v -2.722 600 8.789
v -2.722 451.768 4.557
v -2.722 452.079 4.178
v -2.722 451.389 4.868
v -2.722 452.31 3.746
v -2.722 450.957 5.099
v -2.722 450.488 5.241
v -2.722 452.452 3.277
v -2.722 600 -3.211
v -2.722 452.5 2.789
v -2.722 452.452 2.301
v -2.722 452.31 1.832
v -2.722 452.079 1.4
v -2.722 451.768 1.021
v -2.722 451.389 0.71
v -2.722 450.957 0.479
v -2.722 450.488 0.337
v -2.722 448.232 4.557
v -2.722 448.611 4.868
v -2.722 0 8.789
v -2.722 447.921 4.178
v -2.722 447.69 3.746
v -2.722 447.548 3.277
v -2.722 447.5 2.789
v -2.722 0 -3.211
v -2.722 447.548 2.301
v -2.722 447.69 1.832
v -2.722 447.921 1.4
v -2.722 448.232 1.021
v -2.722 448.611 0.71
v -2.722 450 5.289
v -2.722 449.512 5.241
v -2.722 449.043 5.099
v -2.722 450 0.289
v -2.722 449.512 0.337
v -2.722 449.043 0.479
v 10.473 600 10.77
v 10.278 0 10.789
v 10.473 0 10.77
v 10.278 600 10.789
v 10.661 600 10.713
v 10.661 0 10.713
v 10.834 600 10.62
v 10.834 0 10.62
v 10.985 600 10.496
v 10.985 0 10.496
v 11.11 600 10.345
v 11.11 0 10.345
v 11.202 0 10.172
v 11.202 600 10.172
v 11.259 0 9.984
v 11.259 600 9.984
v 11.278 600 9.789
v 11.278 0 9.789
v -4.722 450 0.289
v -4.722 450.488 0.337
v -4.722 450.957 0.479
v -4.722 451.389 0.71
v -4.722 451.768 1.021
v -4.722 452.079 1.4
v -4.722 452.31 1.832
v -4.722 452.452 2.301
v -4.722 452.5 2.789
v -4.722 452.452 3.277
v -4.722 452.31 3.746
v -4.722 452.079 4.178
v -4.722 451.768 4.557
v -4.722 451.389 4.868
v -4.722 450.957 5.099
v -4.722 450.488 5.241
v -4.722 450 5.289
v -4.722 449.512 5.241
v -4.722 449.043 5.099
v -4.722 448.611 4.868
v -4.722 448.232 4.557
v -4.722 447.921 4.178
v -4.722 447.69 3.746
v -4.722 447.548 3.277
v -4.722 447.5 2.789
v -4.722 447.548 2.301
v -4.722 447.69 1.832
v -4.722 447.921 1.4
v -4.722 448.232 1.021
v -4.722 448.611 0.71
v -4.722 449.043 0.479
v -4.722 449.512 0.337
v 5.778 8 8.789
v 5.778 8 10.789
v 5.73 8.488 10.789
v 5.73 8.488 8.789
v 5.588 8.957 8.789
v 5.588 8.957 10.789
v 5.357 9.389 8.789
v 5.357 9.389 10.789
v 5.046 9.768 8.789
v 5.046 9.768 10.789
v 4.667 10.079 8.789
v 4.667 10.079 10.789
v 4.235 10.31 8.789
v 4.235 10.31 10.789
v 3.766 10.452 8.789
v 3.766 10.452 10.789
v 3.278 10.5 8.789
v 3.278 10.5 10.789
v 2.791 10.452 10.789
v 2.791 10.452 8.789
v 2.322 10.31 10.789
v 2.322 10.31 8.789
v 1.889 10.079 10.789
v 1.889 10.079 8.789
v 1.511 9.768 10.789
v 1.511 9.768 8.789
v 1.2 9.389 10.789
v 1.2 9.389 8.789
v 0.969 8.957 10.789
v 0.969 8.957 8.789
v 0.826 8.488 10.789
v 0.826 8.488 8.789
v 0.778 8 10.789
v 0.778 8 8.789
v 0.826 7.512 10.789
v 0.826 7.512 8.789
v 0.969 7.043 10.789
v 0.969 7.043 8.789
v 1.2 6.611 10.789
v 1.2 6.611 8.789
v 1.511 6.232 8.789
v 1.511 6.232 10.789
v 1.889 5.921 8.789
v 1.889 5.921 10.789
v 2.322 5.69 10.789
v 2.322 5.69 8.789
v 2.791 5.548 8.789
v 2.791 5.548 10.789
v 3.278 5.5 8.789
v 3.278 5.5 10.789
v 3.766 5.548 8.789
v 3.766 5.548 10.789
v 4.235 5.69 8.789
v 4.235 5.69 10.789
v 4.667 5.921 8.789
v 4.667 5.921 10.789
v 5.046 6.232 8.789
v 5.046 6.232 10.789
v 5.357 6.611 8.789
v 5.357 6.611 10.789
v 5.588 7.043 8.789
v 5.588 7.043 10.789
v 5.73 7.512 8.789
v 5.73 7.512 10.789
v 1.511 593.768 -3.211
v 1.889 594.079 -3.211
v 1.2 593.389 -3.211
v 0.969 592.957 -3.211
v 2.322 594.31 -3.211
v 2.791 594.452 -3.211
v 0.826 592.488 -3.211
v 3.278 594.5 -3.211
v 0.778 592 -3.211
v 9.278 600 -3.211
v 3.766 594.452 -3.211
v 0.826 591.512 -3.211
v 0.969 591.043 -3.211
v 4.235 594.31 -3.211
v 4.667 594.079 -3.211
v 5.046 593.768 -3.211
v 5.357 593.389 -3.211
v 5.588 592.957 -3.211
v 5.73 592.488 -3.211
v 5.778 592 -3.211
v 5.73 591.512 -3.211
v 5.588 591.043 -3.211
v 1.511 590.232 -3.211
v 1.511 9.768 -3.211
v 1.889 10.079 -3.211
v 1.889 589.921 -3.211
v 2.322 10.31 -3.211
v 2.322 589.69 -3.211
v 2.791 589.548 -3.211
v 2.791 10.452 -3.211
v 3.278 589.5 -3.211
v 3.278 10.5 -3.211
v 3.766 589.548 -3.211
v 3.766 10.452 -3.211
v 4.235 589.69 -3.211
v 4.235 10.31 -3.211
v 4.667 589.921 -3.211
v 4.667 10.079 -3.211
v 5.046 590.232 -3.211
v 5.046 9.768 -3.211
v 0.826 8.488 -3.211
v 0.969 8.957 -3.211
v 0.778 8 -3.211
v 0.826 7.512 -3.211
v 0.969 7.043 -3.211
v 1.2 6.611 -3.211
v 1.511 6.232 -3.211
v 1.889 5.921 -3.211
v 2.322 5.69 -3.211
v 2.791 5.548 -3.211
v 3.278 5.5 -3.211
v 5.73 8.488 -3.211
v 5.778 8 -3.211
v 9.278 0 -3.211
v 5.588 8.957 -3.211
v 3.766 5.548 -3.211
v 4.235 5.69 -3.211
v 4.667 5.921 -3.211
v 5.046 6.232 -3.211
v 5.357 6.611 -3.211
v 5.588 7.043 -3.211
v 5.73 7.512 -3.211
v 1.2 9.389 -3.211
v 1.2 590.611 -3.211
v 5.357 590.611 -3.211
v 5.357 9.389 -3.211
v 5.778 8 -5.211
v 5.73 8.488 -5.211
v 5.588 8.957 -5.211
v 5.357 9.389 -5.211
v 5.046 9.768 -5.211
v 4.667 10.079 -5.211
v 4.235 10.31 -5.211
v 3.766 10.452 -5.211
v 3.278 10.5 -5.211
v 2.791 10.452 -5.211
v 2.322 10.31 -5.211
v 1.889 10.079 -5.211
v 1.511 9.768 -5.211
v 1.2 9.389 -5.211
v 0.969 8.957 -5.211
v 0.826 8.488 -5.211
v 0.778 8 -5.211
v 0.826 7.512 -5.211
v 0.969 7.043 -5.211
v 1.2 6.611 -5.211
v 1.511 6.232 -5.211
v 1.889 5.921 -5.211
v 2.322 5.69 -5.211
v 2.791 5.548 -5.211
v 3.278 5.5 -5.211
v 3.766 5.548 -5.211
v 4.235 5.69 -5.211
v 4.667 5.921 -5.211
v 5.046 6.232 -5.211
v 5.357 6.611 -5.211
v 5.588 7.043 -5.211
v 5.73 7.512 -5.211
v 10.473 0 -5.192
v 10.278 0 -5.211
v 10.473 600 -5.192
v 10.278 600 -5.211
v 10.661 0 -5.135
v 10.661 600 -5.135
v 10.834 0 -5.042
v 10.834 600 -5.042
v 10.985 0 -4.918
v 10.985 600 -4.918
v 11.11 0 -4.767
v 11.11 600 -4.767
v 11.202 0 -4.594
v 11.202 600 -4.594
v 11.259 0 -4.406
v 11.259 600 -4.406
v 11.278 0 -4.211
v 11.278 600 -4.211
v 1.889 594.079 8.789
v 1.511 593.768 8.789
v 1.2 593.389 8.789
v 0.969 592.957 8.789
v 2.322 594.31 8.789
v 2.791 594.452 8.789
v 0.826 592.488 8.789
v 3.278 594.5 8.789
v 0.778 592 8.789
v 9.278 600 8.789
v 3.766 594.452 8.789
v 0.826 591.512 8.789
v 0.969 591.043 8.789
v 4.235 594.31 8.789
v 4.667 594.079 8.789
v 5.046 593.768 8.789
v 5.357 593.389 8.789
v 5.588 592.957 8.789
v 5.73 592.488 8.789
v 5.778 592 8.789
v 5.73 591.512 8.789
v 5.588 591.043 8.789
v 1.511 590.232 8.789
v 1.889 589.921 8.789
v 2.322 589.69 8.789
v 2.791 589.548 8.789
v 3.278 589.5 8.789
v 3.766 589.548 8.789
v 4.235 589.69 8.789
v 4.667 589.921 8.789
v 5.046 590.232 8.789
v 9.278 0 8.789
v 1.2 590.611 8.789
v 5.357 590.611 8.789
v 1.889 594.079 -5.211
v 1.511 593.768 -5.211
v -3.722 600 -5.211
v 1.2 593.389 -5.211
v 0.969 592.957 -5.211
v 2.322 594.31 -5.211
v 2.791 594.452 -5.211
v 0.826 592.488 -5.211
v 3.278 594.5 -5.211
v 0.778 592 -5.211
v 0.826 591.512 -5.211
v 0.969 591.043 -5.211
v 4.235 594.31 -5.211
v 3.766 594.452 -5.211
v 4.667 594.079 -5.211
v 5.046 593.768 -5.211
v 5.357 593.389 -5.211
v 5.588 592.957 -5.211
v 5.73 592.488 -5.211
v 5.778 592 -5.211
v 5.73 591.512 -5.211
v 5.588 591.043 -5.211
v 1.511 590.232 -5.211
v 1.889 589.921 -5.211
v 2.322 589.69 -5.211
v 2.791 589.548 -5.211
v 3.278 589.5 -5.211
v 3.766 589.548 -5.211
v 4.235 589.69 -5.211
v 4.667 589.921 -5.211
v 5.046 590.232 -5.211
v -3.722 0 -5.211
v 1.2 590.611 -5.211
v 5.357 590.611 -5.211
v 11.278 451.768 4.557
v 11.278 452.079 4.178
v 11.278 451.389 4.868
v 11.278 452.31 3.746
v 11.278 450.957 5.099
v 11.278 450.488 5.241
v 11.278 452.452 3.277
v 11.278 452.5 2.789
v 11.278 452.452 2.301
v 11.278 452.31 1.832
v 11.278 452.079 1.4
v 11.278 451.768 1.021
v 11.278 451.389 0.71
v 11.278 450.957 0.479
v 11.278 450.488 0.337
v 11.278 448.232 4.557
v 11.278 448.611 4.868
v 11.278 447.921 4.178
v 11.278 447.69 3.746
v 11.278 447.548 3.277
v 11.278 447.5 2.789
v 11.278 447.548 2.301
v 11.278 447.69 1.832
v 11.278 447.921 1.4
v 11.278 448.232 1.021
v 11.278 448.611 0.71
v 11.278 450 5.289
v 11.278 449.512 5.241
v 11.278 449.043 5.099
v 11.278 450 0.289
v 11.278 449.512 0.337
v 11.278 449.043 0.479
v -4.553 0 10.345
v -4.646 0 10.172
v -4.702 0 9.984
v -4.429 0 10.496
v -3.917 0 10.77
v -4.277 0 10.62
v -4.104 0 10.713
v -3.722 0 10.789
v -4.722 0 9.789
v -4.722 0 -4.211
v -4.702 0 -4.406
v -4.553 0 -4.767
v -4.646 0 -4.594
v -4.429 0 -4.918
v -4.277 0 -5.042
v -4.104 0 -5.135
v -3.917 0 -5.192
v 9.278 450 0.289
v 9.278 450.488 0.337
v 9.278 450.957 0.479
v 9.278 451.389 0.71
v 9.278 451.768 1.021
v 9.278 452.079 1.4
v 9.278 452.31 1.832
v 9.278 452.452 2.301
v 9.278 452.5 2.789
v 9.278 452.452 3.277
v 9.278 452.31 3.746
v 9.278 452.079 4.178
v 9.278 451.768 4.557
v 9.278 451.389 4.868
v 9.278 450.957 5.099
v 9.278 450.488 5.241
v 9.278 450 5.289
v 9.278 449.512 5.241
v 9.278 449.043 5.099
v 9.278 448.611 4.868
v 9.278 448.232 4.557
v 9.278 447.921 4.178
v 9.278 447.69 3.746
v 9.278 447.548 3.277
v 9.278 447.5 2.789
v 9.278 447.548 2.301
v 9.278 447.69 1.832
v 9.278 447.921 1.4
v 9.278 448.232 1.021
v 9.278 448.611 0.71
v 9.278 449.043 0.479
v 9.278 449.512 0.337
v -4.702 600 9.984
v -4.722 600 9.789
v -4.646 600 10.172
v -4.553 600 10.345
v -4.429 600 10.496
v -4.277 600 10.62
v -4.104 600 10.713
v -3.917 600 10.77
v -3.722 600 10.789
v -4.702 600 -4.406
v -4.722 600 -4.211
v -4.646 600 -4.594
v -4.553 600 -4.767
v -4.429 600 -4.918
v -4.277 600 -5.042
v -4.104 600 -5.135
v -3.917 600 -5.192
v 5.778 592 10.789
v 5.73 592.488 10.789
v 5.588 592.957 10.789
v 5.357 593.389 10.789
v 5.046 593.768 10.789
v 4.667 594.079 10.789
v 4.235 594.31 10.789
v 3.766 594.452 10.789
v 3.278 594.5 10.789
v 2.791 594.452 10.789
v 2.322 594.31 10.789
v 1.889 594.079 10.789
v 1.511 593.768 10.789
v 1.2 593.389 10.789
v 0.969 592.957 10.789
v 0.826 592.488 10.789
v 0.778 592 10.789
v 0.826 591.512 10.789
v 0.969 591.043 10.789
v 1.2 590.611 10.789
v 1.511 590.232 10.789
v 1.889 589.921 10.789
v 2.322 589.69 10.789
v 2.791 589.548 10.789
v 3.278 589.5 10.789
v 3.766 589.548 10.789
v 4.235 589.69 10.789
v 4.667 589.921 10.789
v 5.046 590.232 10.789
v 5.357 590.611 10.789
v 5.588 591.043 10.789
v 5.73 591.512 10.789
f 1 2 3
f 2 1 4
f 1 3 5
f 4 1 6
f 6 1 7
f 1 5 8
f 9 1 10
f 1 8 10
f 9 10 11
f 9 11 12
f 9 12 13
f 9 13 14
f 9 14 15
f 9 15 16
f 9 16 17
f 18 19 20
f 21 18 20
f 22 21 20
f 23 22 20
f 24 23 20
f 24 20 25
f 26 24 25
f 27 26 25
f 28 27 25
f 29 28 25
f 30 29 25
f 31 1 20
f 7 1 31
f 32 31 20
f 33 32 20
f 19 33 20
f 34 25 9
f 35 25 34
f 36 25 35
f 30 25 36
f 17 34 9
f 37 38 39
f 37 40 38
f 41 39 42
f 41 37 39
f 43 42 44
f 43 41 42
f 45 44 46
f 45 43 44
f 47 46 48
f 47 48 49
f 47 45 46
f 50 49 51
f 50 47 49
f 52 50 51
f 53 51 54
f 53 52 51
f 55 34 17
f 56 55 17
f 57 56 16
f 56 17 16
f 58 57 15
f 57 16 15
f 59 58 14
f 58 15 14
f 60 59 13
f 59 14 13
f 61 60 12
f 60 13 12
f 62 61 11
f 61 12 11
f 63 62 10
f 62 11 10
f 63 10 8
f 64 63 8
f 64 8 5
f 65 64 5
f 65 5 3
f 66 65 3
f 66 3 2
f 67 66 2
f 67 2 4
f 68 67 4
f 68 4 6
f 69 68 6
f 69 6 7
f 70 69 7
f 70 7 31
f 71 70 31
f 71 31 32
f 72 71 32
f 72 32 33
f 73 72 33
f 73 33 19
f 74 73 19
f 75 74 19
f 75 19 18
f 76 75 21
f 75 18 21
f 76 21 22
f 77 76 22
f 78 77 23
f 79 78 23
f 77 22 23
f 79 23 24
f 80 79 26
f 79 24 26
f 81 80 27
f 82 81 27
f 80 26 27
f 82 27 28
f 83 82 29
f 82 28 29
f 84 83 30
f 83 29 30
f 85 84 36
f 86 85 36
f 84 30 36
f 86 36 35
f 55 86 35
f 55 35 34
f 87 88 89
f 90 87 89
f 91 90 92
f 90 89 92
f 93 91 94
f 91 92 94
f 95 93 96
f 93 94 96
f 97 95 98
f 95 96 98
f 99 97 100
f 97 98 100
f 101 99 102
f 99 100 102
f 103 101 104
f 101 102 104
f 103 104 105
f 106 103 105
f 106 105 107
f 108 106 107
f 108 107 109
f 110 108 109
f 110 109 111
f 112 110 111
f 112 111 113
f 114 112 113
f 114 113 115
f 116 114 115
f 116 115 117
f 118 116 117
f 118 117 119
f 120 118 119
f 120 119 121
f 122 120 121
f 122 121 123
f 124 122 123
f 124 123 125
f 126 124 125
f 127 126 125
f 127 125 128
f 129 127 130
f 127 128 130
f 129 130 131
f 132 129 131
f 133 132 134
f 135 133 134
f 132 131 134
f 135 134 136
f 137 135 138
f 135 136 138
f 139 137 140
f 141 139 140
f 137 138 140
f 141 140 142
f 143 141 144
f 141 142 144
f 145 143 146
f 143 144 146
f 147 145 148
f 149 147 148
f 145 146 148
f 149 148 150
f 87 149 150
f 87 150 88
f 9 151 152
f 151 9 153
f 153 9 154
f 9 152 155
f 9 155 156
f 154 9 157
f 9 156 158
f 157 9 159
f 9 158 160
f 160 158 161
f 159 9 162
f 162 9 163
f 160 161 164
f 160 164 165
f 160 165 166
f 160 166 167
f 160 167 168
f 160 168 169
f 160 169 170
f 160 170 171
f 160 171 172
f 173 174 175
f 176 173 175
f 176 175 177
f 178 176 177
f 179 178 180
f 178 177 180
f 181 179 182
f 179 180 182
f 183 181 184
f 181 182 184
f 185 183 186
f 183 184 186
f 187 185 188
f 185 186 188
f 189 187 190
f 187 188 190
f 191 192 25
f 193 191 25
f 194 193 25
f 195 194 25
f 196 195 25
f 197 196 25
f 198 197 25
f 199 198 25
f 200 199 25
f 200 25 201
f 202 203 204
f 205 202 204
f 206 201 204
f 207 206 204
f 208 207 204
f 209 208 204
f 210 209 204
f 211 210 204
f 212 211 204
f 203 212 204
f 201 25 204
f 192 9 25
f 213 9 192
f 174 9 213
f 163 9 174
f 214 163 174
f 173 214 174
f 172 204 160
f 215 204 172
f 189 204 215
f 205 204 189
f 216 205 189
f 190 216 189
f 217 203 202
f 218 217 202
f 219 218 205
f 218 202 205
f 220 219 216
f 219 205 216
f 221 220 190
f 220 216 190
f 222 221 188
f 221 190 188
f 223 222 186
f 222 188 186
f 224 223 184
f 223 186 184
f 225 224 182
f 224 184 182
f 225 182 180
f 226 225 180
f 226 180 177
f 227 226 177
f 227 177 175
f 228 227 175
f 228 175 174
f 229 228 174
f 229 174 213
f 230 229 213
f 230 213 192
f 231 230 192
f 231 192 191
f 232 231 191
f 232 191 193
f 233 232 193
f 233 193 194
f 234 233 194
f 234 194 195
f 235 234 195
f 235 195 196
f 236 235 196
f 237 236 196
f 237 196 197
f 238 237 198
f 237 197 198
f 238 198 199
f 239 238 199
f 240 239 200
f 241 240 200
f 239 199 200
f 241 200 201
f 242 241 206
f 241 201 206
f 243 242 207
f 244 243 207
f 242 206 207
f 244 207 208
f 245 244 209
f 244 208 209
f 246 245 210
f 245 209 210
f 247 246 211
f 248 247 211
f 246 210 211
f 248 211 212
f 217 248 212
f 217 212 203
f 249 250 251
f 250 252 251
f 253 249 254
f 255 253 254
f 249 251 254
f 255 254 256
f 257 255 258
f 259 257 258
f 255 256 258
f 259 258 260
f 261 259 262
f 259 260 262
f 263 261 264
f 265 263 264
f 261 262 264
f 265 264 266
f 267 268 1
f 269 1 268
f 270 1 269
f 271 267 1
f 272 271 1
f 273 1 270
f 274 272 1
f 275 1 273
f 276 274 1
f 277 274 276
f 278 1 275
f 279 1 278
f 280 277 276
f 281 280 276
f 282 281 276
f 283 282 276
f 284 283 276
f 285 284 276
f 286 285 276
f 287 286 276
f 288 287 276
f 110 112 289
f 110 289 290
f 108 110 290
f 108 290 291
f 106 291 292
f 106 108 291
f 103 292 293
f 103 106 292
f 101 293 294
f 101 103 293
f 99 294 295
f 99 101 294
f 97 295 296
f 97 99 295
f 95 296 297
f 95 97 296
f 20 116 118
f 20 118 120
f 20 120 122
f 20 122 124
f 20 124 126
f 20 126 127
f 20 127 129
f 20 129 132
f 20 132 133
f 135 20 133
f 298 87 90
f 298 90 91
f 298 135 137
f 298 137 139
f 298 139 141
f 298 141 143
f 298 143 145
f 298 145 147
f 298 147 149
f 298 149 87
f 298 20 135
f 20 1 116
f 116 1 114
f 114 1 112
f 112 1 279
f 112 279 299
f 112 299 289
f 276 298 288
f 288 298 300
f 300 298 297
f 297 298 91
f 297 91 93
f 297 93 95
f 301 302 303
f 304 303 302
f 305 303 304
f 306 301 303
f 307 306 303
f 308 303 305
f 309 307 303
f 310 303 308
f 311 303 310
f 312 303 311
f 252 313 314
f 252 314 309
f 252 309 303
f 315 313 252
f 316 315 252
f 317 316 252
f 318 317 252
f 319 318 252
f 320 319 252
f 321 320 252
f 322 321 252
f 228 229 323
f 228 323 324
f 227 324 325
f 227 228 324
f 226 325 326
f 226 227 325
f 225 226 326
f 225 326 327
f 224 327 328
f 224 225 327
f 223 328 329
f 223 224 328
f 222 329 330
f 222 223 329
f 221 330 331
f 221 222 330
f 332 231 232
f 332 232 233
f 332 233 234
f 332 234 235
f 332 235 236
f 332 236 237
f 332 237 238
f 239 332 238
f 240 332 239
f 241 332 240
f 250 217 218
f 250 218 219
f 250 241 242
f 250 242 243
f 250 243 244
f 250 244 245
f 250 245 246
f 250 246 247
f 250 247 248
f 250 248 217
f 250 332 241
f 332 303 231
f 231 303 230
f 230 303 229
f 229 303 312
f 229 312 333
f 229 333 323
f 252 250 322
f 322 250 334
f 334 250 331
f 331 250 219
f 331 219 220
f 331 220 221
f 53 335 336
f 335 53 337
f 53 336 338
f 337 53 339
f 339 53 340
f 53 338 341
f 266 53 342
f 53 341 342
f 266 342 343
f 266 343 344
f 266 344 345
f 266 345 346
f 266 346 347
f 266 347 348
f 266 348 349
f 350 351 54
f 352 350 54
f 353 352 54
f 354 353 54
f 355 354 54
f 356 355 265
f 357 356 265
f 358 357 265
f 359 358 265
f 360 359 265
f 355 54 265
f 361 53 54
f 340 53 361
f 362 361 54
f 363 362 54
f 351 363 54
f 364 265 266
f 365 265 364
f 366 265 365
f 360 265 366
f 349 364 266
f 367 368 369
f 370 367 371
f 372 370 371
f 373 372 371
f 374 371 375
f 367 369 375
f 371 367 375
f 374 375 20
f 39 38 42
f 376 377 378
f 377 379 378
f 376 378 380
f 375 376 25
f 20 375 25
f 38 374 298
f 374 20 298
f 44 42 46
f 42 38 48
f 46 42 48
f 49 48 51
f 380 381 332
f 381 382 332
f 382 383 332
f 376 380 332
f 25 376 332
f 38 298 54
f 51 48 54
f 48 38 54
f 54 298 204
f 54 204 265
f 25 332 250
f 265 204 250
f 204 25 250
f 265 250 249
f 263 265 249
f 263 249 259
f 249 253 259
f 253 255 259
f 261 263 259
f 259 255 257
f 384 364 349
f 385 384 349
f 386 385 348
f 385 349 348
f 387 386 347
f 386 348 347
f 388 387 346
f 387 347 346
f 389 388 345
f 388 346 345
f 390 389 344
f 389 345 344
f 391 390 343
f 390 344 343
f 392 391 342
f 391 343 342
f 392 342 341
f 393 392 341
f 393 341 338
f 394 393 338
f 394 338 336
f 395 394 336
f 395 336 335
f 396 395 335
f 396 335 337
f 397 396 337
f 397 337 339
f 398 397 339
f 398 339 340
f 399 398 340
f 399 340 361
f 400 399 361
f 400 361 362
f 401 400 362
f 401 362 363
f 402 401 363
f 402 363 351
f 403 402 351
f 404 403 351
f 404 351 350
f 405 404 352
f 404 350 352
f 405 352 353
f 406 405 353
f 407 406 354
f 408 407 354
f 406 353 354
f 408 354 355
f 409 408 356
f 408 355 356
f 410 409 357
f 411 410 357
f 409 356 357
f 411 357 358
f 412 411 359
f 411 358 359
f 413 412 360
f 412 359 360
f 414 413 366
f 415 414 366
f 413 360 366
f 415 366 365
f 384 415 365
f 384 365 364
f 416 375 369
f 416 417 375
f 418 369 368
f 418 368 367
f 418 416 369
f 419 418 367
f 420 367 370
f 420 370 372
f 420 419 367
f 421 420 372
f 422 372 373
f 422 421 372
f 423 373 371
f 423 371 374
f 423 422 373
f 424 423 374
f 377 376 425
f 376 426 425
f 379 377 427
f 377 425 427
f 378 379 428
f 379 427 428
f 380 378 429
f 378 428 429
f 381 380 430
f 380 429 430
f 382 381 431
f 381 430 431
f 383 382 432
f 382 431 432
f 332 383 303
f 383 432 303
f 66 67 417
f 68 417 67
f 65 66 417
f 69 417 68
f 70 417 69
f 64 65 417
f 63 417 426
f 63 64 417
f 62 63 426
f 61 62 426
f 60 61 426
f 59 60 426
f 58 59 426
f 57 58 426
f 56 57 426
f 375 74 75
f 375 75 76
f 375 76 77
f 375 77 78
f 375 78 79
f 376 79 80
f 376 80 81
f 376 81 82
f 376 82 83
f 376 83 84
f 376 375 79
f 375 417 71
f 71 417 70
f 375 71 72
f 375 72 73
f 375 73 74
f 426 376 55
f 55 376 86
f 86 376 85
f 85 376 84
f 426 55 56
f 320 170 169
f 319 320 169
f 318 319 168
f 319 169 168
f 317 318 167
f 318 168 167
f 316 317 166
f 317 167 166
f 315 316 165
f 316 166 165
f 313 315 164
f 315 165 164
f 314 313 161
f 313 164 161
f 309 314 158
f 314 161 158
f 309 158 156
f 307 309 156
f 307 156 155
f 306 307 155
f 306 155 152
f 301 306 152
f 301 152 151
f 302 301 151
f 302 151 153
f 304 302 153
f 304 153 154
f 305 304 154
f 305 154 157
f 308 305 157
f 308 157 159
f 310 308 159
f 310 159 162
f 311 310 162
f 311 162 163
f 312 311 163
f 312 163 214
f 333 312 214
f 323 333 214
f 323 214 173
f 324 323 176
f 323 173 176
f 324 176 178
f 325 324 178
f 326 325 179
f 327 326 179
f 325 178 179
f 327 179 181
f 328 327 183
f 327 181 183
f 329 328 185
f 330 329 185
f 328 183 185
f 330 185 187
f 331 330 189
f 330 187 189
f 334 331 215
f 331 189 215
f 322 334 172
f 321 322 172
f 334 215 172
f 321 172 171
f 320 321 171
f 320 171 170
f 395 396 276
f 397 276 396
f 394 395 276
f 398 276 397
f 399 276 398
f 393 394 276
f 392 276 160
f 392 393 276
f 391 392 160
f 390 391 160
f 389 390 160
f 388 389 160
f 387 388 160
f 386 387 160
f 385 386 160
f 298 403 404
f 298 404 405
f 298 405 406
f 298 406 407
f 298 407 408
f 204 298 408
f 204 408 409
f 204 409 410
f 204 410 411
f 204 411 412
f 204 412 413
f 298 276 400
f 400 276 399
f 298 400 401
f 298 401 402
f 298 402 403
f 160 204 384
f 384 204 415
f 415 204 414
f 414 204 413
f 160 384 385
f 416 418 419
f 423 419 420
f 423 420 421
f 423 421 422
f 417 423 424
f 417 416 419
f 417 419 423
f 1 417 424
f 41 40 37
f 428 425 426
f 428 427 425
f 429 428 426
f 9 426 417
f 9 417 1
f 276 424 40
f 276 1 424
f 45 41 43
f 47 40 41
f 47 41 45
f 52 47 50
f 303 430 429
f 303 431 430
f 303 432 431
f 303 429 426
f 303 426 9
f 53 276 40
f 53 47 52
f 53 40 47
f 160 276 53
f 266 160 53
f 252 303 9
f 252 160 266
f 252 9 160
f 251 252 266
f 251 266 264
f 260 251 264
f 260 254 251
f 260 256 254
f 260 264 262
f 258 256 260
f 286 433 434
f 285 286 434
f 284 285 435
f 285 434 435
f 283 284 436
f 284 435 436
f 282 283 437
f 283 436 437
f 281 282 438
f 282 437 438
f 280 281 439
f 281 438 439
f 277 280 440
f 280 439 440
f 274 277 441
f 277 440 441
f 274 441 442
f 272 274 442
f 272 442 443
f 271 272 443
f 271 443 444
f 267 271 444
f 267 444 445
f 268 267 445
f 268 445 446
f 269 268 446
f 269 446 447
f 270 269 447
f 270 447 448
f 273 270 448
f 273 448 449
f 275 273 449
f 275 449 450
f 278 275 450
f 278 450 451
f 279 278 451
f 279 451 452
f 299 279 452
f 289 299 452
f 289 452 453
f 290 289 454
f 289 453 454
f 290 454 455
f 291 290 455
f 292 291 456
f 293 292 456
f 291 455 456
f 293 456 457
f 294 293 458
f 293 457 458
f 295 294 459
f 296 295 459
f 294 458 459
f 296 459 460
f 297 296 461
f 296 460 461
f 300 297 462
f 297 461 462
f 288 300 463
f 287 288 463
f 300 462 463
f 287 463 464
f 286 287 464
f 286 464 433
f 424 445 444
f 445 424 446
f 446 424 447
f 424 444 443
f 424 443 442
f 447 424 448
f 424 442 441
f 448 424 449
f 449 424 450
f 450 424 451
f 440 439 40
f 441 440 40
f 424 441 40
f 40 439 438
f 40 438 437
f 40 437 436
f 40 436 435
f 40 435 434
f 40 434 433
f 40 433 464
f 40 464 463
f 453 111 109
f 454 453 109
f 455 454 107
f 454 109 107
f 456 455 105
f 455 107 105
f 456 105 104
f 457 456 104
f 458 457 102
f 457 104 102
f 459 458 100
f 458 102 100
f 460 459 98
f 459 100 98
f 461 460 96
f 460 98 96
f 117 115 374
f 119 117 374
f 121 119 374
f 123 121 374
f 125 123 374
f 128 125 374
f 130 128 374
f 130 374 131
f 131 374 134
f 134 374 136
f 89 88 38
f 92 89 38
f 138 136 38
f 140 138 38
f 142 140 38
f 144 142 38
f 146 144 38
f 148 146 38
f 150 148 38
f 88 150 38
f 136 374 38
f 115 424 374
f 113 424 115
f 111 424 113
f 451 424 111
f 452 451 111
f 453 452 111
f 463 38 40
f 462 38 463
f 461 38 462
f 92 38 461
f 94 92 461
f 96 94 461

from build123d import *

# Parameters (mm, degrees)
SKETCH1_W           = 16
SKETCH1_H           = 16
SKETCH1_W_2         = 12
SKETCH1_H_2         = 12
BOSS_EXTRUDE1_DEPTH = 600
FILLET1_R           = 1
SKETCH2_R           = 2.5
CUT_EXTRUDE1_DEPTH  = 16
SKETCH3_R           = 2.5
CUT_EXTRUDE2_DEPTH  = 16


with BuildPart() as part:
    # Sketch1 → Boss-Extrude1 (new body)
    with BuildSketch(Plane(origin=(0, 0, 0), x_dir=(1, 0, 0), z_dir=(0, 1, 0))):
        with Locations((3.278287462, -2.788990826)):
            Rectangle(SKETCH1_W, SKETCH1_H)
        with Locations((3.278287462, -2.788990826)):
            Rectangle(SKETCH1_W_2, SKETCH1_H_2, mode=Mode.SUBTRACT)
    extrude(amount=BOSS_EXTRUDE1_DEPTH)

    # Fillet1
    fillet1_edges = [part.edges().sort_by_distance(p)[0] for p in [
        (-4.721712538, 300, -5.211009174),
        (11.278287462, 300, -5.211009174),
        (11.278287462, 300, 10.788990826),
        (-4.721712538, 300, 10.788990826),
    ]]
    fillet(fillet1_edges, radius=FILLET1_R)

    # Sketch2 → Cut-Extrude1 (cut)
    with BuildSketch(Plane.XY.offset(10.788990826)):
        with Locations((3.278287462, 592)):
            Circle(SKETCH2_R)
        with Locations((3.278287462, 8)):
            Circle(SKETCH2_R)
    extrude(amount=-CUT_EXTRUDE1_DEPTH, mode=Mode.SUBTRACT)

    # Sketch3 → Cut-Extrude2 (cut)
    with BuildSketch(Plane(origin=(11.278287462, 0, 0), x_dir=(0, 0, -1), z_dir=(1, 0, 0))):
        with Locations((-2.788990826, 450)):
            Circle(SKETCH3_R)
    extrude(amount=-CUT_EXTRUDE2_DEPTH, mode=Mode.SUBTRACT)


solid = part.part
